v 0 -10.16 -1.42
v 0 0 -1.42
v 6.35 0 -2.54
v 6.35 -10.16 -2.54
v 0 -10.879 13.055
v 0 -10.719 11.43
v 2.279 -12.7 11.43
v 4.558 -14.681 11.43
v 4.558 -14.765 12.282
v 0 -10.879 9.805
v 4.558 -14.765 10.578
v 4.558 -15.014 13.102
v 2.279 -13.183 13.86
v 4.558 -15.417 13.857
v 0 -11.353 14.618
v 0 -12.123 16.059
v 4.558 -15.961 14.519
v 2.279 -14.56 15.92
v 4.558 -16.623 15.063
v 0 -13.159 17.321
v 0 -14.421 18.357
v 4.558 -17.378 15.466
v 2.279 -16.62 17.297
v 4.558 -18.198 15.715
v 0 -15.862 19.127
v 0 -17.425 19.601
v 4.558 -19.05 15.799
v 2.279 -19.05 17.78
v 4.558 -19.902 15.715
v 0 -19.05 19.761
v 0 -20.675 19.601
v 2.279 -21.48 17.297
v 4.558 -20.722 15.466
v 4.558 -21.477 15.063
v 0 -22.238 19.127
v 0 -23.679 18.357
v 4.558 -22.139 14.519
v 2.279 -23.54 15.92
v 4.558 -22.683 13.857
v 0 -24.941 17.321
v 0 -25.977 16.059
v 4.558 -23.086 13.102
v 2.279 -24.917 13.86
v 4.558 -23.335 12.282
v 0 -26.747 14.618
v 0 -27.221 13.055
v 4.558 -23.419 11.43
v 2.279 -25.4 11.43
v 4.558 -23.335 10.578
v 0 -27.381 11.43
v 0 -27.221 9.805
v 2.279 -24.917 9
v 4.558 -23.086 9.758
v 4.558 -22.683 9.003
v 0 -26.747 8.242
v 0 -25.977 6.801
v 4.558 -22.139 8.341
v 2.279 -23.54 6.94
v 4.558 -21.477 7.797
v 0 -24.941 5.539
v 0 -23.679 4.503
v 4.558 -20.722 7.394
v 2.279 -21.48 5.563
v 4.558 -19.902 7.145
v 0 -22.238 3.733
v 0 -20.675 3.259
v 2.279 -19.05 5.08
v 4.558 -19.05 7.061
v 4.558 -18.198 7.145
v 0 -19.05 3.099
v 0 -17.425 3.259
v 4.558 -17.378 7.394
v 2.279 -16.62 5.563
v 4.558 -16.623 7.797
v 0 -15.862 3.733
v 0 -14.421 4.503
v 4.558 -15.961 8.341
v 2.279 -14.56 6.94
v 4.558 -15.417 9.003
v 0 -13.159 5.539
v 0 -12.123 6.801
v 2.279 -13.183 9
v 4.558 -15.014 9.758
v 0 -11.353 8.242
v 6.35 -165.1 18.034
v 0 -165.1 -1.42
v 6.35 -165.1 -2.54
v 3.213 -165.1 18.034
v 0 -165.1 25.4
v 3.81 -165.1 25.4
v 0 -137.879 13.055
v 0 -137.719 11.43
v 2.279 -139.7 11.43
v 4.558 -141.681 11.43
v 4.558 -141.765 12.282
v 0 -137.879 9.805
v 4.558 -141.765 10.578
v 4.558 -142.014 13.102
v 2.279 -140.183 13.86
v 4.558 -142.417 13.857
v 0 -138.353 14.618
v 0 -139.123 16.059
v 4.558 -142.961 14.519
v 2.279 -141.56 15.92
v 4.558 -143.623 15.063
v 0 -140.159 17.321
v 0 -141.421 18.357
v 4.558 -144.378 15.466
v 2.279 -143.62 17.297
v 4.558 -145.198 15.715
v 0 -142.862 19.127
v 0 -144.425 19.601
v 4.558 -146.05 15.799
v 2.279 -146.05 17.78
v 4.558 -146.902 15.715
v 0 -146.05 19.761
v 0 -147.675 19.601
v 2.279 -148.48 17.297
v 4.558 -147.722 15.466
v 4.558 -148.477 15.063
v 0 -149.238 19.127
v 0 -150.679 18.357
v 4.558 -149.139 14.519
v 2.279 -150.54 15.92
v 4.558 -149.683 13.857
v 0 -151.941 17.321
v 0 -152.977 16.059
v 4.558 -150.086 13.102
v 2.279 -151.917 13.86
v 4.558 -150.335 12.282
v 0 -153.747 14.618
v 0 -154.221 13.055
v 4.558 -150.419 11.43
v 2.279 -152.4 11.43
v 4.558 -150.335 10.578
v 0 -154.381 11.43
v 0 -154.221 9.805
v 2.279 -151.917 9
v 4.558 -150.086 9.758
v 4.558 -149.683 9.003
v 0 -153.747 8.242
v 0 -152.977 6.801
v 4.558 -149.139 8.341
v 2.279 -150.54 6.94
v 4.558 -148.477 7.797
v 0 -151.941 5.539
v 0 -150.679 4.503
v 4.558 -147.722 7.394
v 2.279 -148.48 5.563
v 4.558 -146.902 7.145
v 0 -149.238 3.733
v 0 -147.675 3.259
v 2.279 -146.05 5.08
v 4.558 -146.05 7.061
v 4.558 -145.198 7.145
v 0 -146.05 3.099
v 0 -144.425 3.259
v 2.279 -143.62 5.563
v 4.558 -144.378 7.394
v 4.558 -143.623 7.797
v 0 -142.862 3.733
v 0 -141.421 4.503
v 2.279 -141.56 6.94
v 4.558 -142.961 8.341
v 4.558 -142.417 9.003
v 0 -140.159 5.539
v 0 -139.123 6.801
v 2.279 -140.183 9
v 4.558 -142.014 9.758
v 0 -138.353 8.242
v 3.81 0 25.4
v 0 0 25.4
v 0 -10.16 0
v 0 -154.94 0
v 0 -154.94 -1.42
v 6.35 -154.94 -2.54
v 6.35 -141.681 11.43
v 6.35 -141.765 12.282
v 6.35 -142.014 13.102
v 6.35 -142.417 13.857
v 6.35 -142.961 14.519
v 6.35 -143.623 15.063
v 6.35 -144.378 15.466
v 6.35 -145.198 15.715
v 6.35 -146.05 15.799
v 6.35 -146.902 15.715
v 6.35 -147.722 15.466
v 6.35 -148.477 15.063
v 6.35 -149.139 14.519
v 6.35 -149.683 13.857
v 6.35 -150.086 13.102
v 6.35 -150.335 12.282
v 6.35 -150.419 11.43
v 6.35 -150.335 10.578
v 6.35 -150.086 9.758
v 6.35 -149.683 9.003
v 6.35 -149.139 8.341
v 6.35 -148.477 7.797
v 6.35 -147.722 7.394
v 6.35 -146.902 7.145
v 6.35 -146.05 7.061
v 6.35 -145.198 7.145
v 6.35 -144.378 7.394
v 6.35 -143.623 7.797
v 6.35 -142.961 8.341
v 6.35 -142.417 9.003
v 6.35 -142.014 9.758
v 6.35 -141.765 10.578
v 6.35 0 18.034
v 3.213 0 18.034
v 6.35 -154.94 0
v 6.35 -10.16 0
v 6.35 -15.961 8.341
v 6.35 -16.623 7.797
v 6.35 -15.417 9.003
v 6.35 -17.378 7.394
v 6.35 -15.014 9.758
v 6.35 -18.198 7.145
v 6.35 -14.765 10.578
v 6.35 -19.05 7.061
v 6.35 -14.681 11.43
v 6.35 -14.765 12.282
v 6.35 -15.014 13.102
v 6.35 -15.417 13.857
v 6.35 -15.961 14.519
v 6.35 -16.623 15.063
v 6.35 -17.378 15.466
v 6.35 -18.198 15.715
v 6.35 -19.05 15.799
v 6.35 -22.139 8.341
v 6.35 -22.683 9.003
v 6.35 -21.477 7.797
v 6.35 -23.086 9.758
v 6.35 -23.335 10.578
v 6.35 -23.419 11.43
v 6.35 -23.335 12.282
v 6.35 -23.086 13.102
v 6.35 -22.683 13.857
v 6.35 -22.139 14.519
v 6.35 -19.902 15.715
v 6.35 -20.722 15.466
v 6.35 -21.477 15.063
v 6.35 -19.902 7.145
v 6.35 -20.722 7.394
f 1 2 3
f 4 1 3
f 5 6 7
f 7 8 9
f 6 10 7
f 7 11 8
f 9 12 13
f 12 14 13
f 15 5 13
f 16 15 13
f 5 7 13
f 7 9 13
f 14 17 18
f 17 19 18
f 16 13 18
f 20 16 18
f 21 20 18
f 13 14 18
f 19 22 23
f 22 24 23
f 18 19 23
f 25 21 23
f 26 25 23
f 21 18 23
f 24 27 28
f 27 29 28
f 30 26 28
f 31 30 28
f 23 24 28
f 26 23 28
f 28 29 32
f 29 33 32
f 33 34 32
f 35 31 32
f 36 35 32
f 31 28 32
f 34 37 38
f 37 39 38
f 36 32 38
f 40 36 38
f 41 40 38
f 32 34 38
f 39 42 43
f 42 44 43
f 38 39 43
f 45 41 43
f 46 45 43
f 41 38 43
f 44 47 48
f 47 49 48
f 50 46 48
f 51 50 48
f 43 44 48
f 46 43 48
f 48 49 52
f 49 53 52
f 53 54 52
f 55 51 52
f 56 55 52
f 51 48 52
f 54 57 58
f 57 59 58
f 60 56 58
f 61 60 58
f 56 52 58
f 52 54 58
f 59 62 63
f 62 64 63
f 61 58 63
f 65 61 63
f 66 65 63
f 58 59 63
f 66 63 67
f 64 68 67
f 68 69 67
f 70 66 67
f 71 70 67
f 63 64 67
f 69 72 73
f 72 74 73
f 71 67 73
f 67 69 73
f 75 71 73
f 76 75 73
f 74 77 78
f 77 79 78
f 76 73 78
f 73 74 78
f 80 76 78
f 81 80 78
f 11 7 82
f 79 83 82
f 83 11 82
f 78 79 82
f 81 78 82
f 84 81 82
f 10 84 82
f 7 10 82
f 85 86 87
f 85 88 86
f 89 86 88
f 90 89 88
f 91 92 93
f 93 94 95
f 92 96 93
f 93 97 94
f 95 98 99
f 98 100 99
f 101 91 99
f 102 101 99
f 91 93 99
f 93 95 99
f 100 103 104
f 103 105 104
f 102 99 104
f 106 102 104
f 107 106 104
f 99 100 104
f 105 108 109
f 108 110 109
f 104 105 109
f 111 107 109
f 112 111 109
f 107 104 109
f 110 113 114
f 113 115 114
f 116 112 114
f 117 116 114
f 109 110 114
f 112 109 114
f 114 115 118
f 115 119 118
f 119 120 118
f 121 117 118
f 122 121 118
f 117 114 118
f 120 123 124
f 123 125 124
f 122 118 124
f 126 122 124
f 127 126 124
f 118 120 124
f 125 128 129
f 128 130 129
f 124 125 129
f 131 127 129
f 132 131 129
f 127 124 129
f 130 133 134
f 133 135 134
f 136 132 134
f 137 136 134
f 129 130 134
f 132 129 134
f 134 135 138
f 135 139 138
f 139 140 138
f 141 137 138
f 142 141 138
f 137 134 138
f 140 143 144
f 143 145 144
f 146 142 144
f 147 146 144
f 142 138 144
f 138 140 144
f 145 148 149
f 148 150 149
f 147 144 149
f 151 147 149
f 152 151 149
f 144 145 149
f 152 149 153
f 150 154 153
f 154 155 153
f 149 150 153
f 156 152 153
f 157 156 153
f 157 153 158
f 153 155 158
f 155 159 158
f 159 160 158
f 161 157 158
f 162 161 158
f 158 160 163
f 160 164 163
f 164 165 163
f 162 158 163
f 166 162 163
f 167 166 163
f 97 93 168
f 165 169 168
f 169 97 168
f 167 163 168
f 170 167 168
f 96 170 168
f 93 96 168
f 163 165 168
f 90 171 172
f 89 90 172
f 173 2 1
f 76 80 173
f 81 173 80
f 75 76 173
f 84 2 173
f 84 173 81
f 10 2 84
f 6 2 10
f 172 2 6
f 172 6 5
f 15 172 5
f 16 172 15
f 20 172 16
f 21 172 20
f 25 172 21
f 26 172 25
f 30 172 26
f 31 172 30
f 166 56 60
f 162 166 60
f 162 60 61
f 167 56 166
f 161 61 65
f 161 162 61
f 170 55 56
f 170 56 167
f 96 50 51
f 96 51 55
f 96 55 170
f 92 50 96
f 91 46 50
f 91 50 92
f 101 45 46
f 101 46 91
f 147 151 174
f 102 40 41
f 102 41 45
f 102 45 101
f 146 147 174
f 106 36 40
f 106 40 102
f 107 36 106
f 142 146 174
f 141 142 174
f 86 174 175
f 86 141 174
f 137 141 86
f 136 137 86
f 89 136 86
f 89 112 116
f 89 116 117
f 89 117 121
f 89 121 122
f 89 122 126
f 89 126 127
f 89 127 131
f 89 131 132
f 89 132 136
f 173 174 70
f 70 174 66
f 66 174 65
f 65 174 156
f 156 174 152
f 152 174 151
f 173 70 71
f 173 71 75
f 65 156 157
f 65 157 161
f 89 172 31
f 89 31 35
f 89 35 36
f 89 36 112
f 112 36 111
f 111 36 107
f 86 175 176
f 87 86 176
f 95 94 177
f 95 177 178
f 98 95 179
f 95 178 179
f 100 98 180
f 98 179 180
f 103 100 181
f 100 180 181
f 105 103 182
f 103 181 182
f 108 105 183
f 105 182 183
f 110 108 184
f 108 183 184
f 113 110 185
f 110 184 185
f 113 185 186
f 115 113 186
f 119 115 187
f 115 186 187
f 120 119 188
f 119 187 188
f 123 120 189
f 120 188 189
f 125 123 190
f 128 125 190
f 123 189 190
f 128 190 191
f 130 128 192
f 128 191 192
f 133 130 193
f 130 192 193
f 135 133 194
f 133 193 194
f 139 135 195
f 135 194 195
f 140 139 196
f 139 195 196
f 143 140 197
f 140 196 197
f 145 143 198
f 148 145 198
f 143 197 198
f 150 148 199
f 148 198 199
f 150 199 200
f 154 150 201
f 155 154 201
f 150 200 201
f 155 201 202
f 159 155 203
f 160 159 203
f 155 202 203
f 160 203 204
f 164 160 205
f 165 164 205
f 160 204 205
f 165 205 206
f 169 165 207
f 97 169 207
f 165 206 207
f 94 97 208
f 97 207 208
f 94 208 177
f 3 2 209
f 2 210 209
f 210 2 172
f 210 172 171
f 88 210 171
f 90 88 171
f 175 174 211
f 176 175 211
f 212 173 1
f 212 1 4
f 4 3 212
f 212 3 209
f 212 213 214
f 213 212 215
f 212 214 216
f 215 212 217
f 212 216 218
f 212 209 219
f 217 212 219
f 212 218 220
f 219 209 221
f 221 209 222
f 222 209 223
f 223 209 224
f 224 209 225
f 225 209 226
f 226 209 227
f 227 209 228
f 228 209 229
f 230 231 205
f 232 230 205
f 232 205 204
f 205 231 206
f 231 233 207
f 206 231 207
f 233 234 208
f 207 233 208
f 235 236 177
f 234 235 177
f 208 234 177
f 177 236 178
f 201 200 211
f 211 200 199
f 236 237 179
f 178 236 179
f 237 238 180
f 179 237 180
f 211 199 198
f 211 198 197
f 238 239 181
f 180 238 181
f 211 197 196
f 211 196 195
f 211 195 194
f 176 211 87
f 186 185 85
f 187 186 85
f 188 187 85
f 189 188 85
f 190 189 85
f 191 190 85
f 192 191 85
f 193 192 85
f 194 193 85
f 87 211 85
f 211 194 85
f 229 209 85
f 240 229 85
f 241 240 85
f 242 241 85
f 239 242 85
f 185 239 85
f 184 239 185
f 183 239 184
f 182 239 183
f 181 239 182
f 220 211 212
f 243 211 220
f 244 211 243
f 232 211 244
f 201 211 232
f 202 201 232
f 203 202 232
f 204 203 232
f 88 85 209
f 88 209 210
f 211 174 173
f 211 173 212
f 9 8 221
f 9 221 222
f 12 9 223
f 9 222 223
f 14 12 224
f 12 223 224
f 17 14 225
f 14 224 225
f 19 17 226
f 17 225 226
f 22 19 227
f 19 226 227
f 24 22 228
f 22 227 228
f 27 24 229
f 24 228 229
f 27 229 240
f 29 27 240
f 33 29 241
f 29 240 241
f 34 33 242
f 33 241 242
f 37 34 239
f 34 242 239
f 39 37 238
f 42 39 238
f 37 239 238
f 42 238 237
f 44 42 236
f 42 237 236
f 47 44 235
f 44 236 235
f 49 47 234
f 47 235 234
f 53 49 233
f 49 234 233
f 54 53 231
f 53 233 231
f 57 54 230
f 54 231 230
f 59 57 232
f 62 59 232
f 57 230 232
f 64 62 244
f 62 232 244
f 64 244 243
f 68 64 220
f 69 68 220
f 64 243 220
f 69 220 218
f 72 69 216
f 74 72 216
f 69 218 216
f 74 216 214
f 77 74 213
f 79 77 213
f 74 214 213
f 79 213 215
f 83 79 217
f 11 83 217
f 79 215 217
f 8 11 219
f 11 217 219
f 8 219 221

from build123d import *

# Parameters (mm, degrees)
F1_DEPTH       = 165.1
F3_D           = 8.7376
F3_CSINK_D     = 16.6624
F3_CSINK_ANGLE = 82
F4_W           = 6.35
F4_H           = 10.16
F5_DEPTH       = 2.54
F7_DEPTH       = 165.101


with BuildPart() as f1:
    # F0 (on Front) → F1 (new body)
    with BuildSketch(Plane.XZ):
        Polygon((0, 25.4), (0, 0), (6.35, 0), (6.35, 18.034), (3.2131, 18.034), (3.81, 25.4), align=None)
    extrude(amount=F1_DEPTH)

    # F3 (through all)
    with Locations(Plane(origin=(0, 0, 0), x_dir=(0, -1, 0), z_dir=(-1, 0, 0))):
        with Locations((19.05, 11.43), (146.05, 11.43)):
            CounterSinkHole(F3_D / 2, F3_CSINK_D / 2, counter_sink_angle=F3_CSINK_ANGLE)

    # F4 (on face) → F5 (join)
    with BuildSketch(Plane(origin=(0, 0, 0), x_dir=(1, 0, 0), z_dir=(0, 0, -1))):
        with Locations((3.175, 160.02)):
            Rectangle(F4_W, F4_H)
        with Locations((3.175, 5.08)):
            Rectangle(F4_W, F4_H)
    extrude(amount=F5_DEPTH)

    # F6 (on face) → F7 (cut, through all)
    with BuildSketch(Plane(origin=(0, 0, 0), x_dir=(-1, 0, 0), z_dir=(0, 1, 0))):
        Polygon((0, -1.4203236725), (-6.35, -2.54), (0, -2.54), align=None)
    extrude(amount=-F7_DEPTH, mode=Mode.SUBTRACT)


solid = f1.part
